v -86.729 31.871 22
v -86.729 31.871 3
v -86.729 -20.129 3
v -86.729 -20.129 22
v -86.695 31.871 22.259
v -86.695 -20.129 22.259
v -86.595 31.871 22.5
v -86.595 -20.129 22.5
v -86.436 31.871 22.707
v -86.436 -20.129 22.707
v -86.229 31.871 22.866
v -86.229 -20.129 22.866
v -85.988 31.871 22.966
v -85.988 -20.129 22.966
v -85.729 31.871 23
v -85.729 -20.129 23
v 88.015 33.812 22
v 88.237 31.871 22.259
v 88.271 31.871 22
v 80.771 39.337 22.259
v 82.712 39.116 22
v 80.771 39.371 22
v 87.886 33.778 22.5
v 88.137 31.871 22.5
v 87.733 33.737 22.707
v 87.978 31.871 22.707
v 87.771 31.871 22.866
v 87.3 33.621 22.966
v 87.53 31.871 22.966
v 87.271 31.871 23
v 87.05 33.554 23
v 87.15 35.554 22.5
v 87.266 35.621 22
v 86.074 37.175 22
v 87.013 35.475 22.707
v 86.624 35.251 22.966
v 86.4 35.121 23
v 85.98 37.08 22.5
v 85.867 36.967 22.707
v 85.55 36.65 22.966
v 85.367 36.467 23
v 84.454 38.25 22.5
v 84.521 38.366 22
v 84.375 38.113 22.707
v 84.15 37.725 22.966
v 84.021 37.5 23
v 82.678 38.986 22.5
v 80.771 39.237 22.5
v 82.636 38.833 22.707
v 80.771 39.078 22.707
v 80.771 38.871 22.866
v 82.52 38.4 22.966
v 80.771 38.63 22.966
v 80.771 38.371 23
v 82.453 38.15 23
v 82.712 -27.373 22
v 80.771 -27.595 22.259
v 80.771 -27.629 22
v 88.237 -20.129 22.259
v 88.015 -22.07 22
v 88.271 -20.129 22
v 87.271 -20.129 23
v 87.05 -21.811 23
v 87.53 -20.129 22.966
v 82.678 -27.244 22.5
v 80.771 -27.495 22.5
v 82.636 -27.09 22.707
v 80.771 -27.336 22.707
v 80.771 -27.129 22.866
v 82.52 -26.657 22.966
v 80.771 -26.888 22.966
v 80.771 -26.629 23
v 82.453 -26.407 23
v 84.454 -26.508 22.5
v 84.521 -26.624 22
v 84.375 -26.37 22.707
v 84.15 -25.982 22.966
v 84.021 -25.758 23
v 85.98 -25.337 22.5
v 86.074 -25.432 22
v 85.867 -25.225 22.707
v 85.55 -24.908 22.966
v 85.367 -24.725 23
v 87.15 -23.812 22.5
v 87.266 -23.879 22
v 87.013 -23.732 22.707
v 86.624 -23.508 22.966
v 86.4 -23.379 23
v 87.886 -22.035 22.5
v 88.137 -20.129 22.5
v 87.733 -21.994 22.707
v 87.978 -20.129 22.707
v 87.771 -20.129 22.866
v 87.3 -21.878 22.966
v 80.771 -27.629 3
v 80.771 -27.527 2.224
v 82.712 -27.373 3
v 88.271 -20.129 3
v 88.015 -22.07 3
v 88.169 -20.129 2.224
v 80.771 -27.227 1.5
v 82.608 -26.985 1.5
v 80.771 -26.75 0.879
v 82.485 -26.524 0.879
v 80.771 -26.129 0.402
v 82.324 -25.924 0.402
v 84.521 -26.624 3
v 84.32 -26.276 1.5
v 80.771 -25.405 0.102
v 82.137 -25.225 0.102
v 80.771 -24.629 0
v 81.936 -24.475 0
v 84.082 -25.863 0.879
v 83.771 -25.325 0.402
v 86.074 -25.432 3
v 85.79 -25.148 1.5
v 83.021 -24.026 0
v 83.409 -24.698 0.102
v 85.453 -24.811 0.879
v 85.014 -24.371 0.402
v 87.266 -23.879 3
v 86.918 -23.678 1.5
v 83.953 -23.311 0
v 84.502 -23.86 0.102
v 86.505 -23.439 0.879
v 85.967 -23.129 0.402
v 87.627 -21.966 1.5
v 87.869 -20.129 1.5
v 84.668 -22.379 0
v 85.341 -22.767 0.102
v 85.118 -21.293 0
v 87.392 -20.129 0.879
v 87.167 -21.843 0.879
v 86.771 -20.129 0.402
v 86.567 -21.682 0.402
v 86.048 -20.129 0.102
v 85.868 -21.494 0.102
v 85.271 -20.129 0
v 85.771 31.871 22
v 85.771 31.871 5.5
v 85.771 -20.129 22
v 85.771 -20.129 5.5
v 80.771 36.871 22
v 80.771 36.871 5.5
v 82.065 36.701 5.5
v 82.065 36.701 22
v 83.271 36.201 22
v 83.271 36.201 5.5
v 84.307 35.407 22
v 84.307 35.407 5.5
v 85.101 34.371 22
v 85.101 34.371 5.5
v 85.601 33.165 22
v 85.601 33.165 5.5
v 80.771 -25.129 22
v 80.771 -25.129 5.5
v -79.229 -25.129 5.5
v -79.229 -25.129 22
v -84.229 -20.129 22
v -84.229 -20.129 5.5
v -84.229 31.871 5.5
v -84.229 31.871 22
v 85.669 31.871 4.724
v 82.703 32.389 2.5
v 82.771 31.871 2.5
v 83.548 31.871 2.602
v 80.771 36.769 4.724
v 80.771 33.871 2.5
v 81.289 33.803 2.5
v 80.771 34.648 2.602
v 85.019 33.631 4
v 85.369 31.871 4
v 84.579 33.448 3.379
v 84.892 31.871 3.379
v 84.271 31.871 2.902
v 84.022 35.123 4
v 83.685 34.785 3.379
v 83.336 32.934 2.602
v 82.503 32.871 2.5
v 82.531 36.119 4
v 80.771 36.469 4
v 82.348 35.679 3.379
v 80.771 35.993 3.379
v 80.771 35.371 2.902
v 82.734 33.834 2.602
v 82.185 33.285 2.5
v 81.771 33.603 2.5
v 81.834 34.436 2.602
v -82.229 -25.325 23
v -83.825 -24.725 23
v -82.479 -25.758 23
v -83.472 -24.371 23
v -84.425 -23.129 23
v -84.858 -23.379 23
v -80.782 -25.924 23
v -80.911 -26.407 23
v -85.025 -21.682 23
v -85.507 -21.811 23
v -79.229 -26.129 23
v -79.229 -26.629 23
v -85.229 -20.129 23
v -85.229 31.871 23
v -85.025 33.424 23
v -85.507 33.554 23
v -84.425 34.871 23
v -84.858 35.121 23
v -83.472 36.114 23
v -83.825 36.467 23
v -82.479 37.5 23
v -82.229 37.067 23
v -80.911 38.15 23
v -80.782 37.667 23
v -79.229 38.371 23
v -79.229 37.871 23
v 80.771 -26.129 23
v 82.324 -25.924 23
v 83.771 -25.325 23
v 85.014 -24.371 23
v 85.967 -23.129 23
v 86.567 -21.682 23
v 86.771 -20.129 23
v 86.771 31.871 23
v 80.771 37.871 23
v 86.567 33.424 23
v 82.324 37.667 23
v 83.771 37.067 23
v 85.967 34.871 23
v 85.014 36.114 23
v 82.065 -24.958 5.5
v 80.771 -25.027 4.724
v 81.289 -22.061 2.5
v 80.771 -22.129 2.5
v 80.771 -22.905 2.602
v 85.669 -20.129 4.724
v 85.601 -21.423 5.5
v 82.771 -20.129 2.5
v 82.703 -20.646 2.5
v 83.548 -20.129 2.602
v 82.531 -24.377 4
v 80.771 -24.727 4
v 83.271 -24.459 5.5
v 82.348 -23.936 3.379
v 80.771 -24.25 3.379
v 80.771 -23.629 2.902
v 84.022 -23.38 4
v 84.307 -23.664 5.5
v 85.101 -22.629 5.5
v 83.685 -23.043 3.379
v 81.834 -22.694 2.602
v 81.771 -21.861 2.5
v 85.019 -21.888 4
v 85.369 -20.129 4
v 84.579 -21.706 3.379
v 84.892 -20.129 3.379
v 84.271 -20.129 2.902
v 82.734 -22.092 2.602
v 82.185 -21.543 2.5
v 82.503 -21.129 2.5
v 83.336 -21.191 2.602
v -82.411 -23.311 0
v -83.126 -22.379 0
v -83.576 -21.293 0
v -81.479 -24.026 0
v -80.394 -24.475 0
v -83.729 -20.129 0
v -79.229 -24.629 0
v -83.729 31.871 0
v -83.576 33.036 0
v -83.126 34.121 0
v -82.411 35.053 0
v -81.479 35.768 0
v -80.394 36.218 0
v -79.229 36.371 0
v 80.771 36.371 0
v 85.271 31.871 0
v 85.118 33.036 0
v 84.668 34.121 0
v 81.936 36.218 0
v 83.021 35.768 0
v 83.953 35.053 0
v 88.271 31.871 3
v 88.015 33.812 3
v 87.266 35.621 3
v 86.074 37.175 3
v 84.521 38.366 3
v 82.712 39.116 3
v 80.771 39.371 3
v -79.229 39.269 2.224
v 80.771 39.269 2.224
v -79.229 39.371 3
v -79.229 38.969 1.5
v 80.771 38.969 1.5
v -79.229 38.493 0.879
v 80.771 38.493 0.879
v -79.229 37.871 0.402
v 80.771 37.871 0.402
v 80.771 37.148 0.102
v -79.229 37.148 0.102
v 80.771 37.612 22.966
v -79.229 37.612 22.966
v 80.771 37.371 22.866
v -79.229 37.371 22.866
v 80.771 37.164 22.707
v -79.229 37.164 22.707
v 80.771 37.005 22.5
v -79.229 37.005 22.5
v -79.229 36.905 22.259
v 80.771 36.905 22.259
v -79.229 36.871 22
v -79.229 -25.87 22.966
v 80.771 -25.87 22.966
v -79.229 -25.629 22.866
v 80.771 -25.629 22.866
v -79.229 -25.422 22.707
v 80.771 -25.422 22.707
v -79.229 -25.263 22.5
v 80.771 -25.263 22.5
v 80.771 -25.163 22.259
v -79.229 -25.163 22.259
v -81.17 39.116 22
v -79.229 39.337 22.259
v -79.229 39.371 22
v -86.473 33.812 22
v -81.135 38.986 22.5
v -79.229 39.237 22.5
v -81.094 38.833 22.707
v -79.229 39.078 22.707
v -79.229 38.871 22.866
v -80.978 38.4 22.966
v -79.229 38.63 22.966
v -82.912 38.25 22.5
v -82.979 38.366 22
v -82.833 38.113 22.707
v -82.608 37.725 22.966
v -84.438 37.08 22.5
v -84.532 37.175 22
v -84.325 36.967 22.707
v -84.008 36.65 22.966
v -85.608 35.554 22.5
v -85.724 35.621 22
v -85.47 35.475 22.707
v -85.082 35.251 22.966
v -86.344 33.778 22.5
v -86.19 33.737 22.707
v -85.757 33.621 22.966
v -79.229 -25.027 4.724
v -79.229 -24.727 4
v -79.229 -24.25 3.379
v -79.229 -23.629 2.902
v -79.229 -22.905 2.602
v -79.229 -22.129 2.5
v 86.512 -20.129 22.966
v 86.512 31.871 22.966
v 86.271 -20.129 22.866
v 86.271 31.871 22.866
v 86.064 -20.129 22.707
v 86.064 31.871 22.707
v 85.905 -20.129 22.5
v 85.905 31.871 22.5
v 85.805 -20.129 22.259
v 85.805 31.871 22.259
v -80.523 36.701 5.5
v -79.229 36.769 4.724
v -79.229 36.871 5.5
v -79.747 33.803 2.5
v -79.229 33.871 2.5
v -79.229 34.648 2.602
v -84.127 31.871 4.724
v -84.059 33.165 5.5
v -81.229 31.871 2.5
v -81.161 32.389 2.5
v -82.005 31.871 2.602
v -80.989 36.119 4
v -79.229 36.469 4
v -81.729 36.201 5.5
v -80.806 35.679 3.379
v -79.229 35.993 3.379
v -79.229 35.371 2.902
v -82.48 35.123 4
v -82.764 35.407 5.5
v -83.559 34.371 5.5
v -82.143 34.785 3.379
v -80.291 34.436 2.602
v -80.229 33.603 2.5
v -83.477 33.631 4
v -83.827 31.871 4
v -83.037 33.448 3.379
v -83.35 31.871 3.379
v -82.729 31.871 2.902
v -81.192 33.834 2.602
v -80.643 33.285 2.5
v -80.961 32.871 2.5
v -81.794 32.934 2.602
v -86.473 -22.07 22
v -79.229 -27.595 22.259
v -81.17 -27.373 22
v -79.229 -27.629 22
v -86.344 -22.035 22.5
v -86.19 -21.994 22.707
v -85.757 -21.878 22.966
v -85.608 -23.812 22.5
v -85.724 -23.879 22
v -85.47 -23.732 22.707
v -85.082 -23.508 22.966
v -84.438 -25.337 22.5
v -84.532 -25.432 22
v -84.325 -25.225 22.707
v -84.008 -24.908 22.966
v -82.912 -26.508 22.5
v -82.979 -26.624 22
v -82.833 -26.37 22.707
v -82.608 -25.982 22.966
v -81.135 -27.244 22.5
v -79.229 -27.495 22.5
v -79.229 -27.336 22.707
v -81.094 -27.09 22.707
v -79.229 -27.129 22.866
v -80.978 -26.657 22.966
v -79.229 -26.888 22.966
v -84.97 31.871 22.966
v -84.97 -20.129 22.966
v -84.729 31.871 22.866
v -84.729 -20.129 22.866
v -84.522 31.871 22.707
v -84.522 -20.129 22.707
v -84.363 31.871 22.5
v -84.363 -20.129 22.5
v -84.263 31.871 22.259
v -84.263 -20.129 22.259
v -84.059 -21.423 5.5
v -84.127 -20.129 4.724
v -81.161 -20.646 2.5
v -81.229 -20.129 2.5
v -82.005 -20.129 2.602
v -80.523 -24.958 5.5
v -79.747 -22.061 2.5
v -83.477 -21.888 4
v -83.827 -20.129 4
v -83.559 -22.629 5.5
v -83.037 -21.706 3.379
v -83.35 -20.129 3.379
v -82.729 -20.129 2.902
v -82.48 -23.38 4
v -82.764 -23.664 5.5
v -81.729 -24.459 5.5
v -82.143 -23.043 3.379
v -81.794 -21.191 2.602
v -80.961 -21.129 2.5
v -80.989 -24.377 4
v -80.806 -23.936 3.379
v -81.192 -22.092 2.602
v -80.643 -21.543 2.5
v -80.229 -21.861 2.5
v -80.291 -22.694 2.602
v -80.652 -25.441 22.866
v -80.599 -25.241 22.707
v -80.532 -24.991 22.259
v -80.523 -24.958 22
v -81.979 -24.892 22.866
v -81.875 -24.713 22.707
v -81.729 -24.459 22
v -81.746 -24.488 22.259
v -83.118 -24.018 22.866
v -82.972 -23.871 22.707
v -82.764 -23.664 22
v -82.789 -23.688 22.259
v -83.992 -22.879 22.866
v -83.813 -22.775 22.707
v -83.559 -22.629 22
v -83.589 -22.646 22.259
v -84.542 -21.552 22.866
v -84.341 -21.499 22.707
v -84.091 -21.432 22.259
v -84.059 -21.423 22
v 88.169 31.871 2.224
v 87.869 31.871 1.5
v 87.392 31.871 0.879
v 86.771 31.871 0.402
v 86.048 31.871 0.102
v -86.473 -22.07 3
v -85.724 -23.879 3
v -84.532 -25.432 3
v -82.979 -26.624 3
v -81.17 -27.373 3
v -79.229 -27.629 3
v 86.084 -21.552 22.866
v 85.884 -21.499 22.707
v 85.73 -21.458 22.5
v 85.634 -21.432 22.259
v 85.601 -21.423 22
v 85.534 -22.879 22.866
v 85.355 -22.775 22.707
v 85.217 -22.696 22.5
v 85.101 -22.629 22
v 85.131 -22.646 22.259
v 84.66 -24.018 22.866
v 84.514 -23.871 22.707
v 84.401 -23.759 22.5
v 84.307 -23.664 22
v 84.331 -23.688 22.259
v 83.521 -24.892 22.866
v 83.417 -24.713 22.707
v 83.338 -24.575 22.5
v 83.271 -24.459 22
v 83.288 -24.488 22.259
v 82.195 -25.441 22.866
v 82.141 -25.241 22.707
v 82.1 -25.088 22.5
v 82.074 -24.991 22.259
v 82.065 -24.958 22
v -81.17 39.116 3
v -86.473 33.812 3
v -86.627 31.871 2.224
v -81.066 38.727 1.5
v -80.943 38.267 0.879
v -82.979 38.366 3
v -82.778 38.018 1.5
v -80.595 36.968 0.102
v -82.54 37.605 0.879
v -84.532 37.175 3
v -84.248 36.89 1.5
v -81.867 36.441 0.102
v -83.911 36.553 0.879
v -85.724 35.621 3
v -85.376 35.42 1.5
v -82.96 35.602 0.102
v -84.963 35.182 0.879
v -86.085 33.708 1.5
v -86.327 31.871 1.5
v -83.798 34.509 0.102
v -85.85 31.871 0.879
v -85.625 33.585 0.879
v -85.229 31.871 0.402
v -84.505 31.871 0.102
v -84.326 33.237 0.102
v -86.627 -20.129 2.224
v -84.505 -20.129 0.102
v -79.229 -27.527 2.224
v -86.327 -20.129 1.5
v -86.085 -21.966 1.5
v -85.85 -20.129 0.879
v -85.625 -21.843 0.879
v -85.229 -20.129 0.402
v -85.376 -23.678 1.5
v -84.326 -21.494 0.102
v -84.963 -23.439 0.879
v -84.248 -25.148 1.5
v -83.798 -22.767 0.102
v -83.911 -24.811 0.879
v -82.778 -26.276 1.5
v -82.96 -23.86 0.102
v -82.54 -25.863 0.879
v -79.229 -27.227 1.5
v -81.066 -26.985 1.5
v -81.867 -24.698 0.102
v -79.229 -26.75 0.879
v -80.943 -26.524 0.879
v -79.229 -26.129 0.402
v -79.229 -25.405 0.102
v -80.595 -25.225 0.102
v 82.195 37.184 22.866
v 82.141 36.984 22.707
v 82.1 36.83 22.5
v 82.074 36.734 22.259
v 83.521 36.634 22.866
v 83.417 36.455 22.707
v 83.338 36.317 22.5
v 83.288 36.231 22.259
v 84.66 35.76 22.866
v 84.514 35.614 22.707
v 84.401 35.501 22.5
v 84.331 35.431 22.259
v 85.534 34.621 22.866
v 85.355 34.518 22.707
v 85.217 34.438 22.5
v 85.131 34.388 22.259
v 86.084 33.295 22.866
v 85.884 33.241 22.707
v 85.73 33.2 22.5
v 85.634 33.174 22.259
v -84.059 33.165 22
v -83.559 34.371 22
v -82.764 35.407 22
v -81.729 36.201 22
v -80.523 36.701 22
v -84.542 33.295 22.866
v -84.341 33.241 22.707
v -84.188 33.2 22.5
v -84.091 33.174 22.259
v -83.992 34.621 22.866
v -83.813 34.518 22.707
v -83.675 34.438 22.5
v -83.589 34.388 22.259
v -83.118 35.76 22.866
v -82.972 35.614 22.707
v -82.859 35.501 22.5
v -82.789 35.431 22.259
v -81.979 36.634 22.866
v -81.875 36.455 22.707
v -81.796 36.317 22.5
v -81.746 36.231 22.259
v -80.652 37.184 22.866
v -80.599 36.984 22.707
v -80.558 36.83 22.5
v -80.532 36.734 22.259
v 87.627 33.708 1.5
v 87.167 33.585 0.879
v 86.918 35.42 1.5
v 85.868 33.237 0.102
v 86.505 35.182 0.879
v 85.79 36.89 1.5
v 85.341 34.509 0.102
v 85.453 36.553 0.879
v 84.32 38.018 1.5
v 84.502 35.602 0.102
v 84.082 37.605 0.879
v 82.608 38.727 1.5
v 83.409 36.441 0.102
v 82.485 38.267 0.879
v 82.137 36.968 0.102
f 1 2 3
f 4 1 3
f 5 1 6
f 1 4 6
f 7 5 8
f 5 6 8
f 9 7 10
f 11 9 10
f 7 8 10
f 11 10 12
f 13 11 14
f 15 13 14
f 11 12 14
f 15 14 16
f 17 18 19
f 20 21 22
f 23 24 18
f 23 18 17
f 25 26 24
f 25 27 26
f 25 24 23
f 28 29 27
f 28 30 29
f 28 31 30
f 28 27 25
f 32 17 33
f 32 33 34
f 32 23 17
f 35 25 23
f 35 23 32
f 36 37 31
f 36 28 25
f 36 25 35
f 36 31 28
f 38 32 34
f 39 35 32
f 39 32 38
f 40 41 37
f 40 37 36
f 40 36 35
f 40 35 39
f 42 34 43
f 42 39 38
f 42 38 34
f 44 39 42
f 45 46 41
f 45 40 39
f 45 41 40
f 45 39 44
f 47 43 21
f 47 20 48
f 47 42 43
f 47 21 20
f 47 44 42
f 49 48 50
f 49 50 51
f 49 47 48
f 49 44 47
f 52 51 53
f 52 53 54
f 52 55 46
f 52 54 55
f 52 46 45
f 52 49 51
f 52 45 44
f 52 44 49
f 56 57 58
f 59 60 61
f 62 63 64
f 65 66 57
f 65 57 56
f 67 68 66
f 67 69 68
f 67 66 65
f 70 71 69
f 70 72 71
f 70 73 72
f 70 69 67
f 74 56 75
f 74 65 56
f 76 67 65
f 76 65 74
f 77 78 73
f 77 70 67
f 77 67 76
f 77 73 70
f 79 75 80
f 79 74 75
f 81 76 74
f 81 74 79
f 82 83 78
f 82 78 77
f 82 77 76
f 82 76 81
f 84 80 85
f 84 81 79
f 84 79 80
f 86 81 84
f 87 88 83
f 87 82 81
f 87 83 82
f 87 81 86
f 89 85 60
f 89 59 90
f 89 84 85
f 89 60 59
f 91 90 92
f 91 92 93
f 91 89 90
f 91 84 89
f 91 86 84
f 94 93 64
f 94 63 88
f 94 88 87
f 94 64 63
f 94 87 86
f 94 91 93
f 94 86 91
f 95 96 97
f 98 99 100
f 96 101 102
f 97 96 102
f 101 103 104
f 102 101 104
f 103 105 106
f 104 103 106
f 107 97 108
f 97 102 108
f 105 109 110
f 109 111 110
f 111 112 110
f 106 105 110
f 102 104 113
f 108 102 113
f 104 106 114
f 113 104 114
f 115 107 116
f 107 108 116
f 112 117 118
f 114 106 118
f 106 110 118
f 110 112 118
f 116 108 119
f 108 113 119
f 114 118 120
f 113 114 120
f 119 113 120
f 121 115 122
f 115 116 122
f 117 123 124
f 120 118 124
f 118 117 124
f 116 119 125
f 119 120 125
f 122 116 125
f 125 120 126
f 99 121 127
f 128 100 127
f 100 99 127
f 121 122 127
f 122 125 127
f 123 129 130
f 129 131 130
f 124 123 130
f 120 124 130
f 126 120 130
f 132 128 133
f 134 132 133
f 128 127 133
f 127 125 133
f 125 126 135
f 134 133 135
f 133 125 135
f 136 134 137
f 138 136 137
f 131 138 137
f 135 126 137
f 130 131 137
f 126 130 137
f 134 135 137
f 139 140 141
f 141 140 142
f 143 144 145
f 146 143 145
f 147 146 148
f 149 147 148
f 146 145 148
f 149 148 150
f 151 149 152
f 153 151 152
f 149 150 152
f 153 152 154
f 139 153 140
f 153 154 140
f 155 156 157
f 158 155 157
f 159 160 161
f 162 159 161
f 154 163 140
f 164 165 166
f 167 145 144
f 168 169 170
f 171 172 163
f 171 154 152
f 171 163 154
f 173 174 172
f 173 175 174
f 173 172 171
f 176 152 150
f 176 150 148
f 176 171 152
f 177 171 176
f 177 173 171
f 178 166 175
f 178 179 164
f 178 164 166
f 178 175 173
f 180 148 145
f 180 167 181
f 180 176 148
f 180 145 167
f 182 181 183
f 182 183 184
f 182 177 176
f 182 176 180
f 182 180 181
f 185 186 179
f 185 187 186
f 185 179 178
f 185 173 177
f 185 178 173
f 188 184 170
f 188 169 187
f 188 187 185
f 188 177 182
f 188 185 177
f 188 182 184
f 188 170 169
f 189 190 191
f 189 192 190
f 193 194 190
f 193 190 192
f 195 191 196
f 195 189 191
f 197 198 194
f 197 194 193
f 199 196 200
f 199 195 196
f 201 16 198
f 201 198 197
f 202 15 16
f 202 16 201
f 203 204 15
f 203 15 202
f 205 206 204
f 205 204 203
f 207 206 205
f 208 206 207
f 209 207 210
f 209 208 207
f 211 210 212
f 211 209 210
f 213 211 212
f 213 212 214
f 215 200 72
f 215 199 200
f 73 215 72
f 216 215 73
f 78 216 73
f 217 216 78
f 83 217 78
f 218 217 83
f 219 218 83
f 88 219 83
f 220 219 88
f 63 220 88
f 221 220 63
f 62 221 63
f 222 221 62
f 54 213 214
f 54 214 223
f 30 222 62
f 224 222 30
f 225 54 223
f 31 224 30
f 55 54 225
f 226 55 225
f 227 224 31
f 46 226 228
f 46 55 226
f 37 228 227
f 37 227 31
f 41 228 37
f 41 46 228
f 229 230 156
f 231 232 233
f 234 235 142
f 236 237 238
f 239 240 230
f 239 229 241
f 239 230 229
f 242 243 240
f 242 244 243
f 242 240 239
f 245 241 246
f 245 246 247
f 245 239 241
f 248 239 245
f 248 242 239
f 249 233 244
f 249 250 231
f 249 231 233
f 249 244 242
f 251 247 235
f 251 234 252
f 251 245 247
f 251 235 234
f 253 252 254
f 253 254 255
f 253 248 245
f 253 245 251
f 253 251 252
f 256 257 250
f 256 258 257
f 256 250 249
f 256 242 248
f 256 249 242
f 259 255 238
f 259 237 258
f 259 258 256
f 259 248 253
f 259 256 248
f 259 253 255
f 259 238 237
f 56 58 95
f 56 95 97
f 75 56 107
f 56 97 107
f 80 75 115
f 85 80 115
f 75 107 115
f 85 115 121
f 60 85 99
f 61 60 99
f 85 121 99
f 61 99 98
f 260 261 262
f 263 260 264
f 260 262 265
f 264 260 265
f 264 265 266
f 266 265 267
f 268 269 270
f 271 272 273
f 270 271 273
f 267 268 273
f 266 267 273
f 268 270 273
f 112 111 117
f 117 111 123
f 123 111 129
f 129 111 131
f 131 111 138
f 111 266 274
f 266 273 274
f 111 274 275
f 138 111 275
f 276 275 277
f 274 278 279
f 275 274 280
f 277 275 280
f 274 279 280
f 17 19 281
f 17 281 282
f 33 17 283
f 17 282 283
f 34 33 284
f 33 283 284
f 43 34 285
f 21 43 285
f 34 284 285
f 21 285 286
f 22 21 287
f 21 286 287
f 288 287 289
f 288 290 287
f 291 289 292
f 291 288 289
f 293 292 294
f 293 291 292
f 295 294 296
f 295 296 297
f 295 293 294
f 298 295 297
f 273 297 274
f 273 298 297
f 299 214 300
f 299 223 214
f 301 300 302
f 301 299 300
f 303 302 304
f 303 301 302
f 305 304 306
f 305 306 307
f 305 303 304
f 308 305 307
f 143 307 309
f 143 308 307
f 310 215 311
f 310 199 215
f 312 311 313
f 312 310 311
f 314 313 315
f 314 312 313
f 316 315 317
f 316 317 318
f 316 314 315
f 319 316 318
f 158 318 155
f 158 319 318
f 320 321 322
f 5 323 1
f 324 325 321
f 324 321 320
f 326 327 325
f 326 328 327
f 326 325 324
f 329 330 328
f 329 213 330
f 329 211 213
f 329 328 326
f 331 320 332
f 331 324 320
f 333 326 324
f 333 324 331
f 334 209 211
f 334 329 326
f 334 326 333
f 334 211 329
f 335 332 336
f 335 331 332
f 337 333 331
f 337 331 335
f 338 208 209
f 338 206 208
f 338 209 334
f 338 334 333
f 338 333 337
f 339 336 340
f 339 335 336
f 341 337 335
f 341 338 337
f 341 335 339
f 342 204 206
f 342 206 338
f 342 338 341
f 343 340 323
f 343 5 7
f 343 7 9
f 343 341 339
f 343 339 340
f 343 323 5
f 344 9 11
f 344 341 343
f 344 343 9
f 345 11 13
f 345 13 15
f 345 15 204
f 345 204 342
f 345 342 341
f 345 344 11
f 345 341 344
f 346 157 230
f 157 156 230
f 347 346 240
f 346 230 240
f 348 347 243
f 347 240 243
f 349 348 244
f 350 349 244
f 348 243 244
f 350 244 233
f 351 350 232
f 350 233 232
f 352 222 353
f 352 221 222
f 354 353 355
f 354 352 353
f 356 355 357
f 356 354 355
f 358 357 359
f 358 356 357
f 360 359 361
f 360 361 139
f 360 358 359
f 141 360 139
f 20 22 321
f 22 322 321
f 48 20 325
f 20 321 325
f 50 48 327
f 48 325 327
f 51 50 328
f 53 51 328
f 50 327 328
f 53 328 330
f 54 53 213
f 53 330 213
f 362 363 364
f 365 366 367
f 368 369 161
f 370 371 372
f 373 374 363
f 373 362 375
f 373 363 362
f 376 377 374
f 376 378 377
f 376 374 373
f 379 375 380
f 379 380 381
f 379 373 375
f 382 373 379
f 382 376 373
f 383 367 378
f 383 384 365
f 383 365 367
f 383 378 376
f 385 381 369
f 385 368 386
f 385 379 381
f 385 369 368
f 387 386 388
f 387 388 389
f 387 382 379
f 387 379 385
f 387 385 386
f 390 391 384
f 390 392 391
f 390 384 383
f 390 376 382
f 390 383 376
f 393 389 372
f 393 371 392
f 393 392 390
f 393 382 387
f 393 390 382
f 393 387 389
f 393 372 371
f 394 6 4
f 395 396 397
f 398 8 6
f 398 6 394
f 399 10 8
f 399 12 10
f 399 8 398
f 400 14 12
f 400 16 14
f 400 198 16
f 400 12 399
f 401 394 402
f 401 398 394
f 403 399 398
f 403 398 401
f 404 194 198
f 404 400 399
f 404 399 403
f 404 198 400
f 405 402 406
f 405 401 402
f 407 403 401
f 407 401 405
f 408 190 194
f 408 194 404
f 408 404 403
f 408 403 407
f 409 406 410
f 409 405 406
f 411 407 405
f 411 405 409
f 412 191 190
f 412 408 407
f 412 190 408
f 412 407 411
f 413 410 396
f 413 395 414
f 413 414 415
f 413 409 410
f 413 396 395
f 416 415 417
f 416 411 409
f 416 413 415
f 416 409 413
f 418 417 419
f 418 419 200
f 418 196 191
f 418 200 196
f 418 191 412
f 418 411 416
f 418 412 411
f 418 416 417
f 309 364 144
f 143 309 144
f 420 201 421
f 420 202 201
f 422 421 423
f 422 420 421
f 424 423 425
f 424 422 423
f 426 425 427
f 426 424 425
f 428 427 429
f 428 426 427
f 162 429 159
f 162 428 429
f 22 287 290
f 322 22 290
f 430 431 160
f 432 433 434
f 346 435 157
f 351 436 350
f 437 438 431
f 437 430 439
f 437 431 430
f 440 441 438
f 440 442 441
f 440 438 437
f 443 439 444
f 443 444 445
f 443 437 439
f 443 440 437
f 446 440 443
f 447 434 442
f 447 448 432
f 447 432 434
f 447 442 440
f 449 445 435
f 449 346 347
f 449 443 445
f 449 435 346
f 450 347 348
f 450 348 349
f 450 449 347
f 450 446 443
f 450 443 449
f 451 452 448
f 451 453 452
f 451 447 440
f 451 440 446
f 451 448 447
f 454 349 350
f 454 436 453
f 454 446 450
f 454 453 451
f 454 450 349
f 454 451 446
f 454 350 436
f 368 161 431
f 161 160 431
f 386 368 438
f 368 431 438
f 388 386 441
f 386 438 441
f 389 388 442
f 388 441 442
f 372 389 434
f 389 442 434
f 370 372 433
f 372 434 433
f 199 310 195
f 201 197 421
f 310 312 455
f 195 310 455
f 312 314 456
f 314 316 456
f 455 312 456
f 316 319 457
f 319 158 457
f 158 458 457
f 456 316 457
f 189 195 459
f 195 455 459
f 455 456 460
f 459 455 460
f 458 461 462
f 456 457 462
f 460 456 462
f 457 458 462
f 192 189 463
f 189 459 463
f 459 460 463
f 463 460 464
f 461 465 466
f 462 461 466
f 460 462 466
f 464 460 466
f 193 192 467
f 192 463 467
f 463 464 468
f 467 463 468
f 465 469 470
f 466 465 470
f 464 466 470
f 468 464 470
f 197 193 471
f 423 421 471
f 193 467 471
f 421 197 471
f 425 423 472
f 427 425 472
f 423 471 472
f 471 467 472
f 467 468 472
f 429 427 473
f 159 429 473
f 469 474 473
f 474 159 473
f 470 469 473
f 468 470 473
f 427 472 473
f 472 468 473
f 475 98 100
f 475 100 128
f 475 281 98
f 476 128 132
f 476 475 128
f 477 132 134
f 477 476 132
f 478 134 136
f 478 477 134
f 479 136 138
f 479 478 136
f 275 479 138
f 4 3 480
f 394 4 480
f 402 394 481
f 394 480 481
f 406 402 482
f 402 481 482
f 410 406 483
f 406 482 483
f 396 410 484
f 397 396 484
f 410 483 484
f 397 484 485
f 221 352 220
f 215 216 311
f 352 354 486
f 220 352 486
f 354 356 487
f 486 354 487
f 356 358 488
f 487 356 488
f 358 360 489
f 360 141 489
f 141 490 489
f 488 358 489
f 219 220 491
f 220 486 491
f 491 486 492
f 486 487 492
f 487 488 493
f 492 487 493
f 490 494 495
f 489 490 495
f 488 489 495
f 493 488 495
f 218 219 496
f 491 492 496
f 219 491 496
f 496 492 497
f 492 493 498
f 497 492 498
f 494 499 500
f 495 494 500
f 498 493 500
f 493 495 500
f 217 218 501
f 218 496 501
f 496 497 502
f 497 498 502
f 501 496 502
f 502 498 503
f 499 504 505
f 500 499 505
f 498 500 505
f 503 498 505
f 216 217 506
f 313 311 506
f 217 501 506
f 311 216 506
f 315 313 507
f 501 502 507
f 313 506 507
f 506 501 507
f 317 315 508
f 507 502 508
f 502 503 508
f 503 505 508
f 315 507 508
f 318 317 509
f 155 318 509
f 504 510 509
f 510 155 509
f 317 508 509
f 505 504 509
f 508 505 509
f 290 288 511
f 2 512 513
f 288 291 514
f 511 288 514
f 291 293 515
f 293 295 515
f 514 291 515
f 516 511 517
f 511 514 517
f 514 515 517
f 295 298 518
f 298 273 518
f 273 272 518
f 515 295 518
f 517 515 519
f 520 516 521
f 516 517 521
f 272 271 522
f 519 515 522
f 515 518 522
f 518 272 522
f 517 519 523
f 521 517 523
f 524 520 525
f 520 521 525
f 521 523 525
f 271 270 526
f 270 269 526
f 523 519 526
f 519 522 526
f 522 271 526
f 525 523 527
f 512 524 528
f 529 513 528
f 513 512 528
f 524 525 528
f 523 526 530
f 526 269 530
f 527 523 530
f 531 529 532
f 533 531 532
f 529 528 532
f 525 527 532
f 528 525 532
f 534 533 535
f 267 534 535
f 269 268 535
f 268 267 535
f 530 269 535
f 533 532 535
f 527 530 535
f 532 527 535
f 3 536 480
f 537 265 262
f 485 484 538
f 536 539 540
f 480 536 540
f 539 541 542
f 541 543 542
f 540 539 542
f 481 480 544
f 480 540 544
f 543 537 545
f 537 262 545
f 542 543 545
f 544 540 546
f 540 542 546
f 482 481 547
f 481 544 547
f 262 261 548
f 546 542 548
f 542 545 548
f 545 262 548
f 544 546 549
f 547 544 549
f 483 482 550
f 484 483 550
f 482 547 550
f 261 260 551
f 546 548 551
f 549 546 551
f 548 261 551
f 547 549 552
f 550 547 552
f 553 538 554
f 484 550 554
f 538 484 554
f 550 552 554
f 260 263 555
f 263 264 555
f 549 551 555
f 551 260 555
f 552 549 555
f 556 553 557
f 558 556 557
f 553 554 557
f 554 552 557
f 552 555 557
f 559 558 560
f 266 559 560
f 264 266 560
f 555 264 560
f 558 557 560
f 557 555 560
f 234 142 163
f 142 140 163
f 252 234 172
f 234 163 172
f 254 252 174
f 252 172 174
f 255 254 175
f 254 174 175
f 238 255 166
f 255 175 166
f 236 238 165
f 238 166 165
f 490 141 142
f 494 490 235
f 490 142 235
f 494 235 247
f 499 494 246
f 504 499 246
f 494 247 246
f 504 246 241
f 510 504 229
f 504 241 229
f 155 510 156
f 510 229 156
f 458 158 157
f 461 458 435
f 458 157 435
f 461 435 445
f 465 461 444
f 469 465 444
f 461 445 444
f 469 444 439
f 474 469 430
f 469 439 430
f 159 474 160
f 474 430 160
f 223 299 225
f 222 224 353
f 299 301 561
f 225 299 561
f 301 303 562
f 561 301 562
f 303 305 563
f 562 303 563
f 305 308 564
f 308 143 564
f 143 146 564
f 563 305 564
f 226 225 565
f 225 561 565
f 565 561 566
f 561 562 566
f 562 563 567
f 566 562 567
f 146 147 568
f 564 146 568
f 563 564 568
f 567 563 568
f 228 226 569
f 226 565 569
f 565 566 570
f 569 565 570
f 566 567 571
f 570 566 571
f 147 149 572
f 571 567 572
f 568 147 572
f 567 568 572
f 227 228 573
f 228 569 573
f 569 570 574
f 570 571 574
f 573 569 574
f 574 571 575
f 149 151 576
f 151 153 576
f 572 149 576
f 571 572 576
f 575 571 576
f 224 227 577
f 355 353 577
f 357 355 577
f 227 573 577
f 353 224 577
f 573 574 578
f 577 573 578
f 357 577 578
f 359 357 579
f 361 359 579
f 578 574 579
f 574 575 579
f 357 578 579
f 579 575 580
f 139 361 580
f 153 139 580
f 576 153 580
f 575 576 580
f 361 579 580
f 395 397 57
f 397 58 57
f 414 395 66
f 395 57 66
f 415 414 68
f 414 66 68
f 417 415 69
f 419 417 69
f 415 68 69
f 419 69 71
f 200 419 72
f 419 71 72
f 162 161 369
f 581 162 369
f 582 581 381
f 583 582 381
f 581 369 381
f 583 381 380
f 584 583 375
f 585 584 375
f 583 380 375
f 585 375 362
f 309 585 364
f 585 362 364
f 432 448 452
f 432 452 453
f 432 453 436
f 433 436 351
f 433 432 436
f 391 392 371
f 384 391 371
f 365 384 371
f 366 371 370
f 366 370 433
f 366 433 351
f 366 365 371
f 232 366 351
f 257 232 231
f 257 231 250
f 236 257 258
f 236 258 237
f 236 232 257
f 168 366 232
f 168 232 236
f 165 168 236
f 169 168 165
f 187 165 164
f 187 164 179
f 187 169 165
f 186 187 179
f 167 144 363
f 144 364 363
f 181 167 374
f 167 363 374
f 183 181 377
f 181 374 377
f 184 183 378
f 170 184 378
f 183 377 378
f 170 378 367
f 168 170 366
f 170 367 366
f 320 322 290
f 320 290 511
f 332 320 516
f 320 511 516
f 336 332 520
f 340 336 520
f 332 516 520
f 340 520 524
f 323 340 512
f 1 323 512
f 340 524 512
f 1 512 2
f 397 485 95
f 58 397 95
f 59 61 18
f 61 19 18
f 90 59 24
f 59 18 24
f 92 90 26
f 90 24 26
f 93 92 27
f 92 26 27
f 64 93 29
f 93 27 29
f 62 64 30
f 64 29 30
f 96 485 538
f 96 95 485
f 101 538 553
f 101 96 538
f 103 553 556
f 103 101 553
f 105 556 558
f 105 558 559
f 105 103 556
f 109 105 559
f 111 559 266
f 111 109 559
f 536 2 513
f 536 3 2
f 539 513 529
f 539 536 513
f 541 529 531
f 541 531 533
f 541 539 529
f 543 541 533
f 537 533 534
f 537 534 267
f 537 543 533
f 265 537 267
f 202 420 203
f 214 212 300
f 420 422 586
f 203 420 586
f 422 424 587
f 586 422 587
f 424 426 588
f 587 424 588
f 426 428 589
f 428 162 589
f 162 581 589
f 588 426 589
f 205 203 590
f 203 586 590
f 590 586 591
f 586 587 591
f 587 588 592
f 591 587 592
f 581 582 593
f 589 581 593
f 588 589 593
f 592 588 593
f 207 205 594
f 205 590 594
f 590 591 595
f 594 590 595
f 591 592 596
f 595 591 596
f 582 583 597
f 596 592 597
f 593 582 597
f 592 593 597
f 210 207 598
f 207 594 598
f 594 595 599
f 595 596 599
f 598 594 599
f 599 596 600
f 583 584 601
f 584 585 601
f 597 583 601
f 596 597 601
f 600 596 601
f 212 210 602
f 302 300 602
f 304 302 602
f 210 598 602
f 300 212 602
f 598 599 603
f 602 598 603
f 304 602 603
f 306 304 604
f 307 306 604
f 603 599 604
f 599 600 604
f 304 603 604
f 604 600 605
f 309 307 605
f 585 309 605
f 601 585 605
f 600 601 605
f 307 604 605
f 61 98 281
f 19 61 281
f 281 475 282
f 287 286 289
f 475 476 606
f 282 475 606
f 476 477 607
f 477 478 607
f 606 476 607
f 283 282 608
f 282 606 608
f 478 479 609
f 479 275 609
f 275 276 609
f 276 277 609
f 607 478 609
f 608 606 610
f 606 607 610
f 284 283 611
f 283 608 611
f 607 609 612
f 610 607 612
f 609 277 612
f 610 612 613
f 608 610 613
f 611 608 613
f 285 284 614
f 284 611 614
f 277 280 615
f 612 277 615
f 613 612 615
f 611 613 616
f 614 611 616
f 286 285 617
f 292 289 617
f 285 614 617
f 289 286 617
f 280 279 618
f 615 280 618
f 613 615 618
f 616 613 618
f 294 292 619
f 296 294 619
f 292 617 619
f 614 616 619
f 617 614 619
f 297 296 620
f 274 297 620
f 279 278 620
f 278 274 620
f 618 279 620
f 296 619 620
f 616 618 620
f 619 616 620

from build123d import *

# Parameters (mm, degrees)
F1_DEPTH = 2.5
F2_DEPTH = 23
F3_R     = 3
F4_R     = 1
F5_R     = 3


with BuildPart() as f1:
    # F0 (on Top) → F1 (new body)
    with BuildSketch(Plane.XY):
        with BuildLine():
            Line((80.771052, 39.371213), (-79.228948, 39.371213))
            ThreePointArc((-79.228948, 39.371213), (-84.532249, 37.174514), (-86.728948, 31.871213))
            Line((-86.728948, 31.871213), (-86.728948, -20.128787))
            ThreePointArc((-86.728948, -20.128787), (-84.532249, -25.432087), (-79.228948, -27.628787))
            Line((-79.228948, -27.628787), (80.771052, -27.628787))
            ThreePointArc((80.771052, -27.628787), (86.074353, -25.432087), (88.271052, -20.128787))
            Line((88.271052, -20.128787), (88.271052, 31.871213))
            ThreePointArc((88.271052, 31.871213), (86.074353, 37.174514), (80.771052, 39.371213))
        make_face()
        with BuildLine():
            ThreePointArc((-84.228948, 31.871213), (-82.764482, 35.406747), (-79.228948, 36.871213))
            Line((-79.228948, 36.871213), (80.771052, 36.871213))
            ThreePointArc((80.771052, 36.871213), (84.306586, 35.406747), (85.771052, 31.871213))
            Line((85.771052, 31.871213), (85.771052, -20.128787))
            ThreePointArc((85.771052, -20.128787), (84.306586, -23.66432), (80.771052, -25.128787))
            Line((80.771052, -25.128787), (-79.228948, -25.128787))
            ThreePointArc((-79.228948, -25.128787), (-82.764482, -23.66432), (-84.228948, -20.128787))
            Line((-84.228948, -20.128787), (-84.228948, 31.871213))
        make_face(mode=Mode.SUBTRACT)
        with BuildLine():
            Line((80.771052, 36.871213), (-79.228948, 36.871213))
            ThreePointArc((-79.228948, 36.871213), (-82.764482, 35.406747), (-84.228948, 31.871213))
            Line((-84.228948, 31.871213), (-84.228948, -20.128787))
            ThreePointArc((-84.228948, -20.128787), (-82.764482, -23.66432), (-79.228948, -25.128787))
            Line((-79.228948, -25.128787), (80.771052, -25.128787))
            ThreePointArc((80.771052, -25.128787), (84.306586, -23.66432), (85.771052, -20.128787))
            Line((85.771052, -20.128787), (85.771052, 31.871213))
            ThreePointArc((85.771052, 31.871213), (84.306586, 35.406747), (80.771052, 36.871213))
        make_face()
    extrude(amount=F1_DEPTH)

    # F0 (on Top) → F2 (join)
    with BuildSketch(Plane.XY):
        with BuildLine():
            Line((80.771052, 39.371213), (-79.228948, 39.371213))
            ThreePointArc((-79.228948, 39.371213), (-84.532249, 37.174514), (-86.728948, 31.871213))
            Line((-86.728948, 31.871213), (-86.728948, -20.128787))
            ThreePointArc((-86.728948, -20.128787), (-84.532249, -25.432087), (-79.228948, -27.628787))
            Line((-79.228948, -27.628787), (80.771052, -27.628787))
            ThreePointArc((80.771052, -27.628787), (86.074353, -25.432087), (88.271052, -20.128787))
            Line((88.271052, -20.128787), (88.271052, 31.871213))
            ThreePointArc((88.271052, 31.871213), (86.074353, 37.174514), (80.771052, 39.371213))
        make_face()
        with BuildLine():
            ThreePointArc((-84.228948, 31.871213), (-82.764482, 35.406747), (-79.228948, 36.871213))
            Line((-79.228948, 36.871213), (80.771052, 36.871213))
            ThreePointArc((80.771052, 36.871213), (84.306586, 35.406747), (85.771052, 31.871213))
            Line((85.771052, 31.871213), (85.771052, -20.128787))
            ThreePointArc((85.771052, -20.128787), (84.306586, -23.66432), (80.771052, -25.128787))
            Line((80.771052, -25.128787), (-79.228948, -25.128787))
            ThreePointArc((-79.228948, -25.128787), (-82.764482, -23.66432), (-84.228948, -20.128787))
            Line((-84.228948, -20.128787), (-84.228948, 31.871213))
        make_face(mode=Mode.SUBTRACT)
    extrude(amount=F2_DEPTH)

    # F3
    f3_edges = [f1.edges().sort_by_distance(p)[0] for p in [
        (0.771052, 39.371213, 0),
        (-84.532249, 37.174514, 0),
        (-86.728948, 5.871213, 0),
        (-84.532249, -25.432087, 0),
        (0.771052, -27.628787, 0),
        (86.074353, -25.432087, 0),
        (88.271052, 5.871213, 0),
        (86.074353, 37.174514, 0),
    ]]
    fillet(f3_edges, radius=F3_R)

    # F4
    f4_edges = [f1.edges().sort_by_distance(p)[0] for p in [
        (0.771052, 39.371213, 23),
        (-84.532249, 37.174514, 23),
        (-86.728948, 5.871213, 23),
        (-84.532249, -25.432087, 23),
        (0.771052, -27.628787, 23),
        (86.074353, -25.432087, 23),
        (88.271052, 5.871213, 23),
        (86.074353, 37.174514, 23),
        (-84.228948, 5.871213, 23),
        (-82.764482, 35.406747, 23),
        (0.771052, 36.871213, 23),
        (84.306586, 35.406747, 23),
        (85.771052, 5.871213, 23),
        (84.306586, -23.66432, 23),
        (0.771052, -25.128787, 23),
        (-82.764482, -23.66432, 23),
    ]]
    fillet(f4_edges, radius=F4_R)

    # F5
    f5_edges = [f1.edges().sort_by_distance(p)[0] for p in [
        (0.771052, -25.128787, 2.5),
        (84.306586, -23.66432, 2.5),
        (0.771052, 36.871213, 2.5),
        (84.306586, 35.406747, 2.5),
        (-82.764482, -23.66432, 2.5),
        (-84.228948, 5.871213, 2.5),
        (-82.764482, 35.406747, 2.5),
        (85.771052, 5.871213, 2.5),
    ]]
    fillet(f5_edges, radius=F5_R)


solid = f1.part
